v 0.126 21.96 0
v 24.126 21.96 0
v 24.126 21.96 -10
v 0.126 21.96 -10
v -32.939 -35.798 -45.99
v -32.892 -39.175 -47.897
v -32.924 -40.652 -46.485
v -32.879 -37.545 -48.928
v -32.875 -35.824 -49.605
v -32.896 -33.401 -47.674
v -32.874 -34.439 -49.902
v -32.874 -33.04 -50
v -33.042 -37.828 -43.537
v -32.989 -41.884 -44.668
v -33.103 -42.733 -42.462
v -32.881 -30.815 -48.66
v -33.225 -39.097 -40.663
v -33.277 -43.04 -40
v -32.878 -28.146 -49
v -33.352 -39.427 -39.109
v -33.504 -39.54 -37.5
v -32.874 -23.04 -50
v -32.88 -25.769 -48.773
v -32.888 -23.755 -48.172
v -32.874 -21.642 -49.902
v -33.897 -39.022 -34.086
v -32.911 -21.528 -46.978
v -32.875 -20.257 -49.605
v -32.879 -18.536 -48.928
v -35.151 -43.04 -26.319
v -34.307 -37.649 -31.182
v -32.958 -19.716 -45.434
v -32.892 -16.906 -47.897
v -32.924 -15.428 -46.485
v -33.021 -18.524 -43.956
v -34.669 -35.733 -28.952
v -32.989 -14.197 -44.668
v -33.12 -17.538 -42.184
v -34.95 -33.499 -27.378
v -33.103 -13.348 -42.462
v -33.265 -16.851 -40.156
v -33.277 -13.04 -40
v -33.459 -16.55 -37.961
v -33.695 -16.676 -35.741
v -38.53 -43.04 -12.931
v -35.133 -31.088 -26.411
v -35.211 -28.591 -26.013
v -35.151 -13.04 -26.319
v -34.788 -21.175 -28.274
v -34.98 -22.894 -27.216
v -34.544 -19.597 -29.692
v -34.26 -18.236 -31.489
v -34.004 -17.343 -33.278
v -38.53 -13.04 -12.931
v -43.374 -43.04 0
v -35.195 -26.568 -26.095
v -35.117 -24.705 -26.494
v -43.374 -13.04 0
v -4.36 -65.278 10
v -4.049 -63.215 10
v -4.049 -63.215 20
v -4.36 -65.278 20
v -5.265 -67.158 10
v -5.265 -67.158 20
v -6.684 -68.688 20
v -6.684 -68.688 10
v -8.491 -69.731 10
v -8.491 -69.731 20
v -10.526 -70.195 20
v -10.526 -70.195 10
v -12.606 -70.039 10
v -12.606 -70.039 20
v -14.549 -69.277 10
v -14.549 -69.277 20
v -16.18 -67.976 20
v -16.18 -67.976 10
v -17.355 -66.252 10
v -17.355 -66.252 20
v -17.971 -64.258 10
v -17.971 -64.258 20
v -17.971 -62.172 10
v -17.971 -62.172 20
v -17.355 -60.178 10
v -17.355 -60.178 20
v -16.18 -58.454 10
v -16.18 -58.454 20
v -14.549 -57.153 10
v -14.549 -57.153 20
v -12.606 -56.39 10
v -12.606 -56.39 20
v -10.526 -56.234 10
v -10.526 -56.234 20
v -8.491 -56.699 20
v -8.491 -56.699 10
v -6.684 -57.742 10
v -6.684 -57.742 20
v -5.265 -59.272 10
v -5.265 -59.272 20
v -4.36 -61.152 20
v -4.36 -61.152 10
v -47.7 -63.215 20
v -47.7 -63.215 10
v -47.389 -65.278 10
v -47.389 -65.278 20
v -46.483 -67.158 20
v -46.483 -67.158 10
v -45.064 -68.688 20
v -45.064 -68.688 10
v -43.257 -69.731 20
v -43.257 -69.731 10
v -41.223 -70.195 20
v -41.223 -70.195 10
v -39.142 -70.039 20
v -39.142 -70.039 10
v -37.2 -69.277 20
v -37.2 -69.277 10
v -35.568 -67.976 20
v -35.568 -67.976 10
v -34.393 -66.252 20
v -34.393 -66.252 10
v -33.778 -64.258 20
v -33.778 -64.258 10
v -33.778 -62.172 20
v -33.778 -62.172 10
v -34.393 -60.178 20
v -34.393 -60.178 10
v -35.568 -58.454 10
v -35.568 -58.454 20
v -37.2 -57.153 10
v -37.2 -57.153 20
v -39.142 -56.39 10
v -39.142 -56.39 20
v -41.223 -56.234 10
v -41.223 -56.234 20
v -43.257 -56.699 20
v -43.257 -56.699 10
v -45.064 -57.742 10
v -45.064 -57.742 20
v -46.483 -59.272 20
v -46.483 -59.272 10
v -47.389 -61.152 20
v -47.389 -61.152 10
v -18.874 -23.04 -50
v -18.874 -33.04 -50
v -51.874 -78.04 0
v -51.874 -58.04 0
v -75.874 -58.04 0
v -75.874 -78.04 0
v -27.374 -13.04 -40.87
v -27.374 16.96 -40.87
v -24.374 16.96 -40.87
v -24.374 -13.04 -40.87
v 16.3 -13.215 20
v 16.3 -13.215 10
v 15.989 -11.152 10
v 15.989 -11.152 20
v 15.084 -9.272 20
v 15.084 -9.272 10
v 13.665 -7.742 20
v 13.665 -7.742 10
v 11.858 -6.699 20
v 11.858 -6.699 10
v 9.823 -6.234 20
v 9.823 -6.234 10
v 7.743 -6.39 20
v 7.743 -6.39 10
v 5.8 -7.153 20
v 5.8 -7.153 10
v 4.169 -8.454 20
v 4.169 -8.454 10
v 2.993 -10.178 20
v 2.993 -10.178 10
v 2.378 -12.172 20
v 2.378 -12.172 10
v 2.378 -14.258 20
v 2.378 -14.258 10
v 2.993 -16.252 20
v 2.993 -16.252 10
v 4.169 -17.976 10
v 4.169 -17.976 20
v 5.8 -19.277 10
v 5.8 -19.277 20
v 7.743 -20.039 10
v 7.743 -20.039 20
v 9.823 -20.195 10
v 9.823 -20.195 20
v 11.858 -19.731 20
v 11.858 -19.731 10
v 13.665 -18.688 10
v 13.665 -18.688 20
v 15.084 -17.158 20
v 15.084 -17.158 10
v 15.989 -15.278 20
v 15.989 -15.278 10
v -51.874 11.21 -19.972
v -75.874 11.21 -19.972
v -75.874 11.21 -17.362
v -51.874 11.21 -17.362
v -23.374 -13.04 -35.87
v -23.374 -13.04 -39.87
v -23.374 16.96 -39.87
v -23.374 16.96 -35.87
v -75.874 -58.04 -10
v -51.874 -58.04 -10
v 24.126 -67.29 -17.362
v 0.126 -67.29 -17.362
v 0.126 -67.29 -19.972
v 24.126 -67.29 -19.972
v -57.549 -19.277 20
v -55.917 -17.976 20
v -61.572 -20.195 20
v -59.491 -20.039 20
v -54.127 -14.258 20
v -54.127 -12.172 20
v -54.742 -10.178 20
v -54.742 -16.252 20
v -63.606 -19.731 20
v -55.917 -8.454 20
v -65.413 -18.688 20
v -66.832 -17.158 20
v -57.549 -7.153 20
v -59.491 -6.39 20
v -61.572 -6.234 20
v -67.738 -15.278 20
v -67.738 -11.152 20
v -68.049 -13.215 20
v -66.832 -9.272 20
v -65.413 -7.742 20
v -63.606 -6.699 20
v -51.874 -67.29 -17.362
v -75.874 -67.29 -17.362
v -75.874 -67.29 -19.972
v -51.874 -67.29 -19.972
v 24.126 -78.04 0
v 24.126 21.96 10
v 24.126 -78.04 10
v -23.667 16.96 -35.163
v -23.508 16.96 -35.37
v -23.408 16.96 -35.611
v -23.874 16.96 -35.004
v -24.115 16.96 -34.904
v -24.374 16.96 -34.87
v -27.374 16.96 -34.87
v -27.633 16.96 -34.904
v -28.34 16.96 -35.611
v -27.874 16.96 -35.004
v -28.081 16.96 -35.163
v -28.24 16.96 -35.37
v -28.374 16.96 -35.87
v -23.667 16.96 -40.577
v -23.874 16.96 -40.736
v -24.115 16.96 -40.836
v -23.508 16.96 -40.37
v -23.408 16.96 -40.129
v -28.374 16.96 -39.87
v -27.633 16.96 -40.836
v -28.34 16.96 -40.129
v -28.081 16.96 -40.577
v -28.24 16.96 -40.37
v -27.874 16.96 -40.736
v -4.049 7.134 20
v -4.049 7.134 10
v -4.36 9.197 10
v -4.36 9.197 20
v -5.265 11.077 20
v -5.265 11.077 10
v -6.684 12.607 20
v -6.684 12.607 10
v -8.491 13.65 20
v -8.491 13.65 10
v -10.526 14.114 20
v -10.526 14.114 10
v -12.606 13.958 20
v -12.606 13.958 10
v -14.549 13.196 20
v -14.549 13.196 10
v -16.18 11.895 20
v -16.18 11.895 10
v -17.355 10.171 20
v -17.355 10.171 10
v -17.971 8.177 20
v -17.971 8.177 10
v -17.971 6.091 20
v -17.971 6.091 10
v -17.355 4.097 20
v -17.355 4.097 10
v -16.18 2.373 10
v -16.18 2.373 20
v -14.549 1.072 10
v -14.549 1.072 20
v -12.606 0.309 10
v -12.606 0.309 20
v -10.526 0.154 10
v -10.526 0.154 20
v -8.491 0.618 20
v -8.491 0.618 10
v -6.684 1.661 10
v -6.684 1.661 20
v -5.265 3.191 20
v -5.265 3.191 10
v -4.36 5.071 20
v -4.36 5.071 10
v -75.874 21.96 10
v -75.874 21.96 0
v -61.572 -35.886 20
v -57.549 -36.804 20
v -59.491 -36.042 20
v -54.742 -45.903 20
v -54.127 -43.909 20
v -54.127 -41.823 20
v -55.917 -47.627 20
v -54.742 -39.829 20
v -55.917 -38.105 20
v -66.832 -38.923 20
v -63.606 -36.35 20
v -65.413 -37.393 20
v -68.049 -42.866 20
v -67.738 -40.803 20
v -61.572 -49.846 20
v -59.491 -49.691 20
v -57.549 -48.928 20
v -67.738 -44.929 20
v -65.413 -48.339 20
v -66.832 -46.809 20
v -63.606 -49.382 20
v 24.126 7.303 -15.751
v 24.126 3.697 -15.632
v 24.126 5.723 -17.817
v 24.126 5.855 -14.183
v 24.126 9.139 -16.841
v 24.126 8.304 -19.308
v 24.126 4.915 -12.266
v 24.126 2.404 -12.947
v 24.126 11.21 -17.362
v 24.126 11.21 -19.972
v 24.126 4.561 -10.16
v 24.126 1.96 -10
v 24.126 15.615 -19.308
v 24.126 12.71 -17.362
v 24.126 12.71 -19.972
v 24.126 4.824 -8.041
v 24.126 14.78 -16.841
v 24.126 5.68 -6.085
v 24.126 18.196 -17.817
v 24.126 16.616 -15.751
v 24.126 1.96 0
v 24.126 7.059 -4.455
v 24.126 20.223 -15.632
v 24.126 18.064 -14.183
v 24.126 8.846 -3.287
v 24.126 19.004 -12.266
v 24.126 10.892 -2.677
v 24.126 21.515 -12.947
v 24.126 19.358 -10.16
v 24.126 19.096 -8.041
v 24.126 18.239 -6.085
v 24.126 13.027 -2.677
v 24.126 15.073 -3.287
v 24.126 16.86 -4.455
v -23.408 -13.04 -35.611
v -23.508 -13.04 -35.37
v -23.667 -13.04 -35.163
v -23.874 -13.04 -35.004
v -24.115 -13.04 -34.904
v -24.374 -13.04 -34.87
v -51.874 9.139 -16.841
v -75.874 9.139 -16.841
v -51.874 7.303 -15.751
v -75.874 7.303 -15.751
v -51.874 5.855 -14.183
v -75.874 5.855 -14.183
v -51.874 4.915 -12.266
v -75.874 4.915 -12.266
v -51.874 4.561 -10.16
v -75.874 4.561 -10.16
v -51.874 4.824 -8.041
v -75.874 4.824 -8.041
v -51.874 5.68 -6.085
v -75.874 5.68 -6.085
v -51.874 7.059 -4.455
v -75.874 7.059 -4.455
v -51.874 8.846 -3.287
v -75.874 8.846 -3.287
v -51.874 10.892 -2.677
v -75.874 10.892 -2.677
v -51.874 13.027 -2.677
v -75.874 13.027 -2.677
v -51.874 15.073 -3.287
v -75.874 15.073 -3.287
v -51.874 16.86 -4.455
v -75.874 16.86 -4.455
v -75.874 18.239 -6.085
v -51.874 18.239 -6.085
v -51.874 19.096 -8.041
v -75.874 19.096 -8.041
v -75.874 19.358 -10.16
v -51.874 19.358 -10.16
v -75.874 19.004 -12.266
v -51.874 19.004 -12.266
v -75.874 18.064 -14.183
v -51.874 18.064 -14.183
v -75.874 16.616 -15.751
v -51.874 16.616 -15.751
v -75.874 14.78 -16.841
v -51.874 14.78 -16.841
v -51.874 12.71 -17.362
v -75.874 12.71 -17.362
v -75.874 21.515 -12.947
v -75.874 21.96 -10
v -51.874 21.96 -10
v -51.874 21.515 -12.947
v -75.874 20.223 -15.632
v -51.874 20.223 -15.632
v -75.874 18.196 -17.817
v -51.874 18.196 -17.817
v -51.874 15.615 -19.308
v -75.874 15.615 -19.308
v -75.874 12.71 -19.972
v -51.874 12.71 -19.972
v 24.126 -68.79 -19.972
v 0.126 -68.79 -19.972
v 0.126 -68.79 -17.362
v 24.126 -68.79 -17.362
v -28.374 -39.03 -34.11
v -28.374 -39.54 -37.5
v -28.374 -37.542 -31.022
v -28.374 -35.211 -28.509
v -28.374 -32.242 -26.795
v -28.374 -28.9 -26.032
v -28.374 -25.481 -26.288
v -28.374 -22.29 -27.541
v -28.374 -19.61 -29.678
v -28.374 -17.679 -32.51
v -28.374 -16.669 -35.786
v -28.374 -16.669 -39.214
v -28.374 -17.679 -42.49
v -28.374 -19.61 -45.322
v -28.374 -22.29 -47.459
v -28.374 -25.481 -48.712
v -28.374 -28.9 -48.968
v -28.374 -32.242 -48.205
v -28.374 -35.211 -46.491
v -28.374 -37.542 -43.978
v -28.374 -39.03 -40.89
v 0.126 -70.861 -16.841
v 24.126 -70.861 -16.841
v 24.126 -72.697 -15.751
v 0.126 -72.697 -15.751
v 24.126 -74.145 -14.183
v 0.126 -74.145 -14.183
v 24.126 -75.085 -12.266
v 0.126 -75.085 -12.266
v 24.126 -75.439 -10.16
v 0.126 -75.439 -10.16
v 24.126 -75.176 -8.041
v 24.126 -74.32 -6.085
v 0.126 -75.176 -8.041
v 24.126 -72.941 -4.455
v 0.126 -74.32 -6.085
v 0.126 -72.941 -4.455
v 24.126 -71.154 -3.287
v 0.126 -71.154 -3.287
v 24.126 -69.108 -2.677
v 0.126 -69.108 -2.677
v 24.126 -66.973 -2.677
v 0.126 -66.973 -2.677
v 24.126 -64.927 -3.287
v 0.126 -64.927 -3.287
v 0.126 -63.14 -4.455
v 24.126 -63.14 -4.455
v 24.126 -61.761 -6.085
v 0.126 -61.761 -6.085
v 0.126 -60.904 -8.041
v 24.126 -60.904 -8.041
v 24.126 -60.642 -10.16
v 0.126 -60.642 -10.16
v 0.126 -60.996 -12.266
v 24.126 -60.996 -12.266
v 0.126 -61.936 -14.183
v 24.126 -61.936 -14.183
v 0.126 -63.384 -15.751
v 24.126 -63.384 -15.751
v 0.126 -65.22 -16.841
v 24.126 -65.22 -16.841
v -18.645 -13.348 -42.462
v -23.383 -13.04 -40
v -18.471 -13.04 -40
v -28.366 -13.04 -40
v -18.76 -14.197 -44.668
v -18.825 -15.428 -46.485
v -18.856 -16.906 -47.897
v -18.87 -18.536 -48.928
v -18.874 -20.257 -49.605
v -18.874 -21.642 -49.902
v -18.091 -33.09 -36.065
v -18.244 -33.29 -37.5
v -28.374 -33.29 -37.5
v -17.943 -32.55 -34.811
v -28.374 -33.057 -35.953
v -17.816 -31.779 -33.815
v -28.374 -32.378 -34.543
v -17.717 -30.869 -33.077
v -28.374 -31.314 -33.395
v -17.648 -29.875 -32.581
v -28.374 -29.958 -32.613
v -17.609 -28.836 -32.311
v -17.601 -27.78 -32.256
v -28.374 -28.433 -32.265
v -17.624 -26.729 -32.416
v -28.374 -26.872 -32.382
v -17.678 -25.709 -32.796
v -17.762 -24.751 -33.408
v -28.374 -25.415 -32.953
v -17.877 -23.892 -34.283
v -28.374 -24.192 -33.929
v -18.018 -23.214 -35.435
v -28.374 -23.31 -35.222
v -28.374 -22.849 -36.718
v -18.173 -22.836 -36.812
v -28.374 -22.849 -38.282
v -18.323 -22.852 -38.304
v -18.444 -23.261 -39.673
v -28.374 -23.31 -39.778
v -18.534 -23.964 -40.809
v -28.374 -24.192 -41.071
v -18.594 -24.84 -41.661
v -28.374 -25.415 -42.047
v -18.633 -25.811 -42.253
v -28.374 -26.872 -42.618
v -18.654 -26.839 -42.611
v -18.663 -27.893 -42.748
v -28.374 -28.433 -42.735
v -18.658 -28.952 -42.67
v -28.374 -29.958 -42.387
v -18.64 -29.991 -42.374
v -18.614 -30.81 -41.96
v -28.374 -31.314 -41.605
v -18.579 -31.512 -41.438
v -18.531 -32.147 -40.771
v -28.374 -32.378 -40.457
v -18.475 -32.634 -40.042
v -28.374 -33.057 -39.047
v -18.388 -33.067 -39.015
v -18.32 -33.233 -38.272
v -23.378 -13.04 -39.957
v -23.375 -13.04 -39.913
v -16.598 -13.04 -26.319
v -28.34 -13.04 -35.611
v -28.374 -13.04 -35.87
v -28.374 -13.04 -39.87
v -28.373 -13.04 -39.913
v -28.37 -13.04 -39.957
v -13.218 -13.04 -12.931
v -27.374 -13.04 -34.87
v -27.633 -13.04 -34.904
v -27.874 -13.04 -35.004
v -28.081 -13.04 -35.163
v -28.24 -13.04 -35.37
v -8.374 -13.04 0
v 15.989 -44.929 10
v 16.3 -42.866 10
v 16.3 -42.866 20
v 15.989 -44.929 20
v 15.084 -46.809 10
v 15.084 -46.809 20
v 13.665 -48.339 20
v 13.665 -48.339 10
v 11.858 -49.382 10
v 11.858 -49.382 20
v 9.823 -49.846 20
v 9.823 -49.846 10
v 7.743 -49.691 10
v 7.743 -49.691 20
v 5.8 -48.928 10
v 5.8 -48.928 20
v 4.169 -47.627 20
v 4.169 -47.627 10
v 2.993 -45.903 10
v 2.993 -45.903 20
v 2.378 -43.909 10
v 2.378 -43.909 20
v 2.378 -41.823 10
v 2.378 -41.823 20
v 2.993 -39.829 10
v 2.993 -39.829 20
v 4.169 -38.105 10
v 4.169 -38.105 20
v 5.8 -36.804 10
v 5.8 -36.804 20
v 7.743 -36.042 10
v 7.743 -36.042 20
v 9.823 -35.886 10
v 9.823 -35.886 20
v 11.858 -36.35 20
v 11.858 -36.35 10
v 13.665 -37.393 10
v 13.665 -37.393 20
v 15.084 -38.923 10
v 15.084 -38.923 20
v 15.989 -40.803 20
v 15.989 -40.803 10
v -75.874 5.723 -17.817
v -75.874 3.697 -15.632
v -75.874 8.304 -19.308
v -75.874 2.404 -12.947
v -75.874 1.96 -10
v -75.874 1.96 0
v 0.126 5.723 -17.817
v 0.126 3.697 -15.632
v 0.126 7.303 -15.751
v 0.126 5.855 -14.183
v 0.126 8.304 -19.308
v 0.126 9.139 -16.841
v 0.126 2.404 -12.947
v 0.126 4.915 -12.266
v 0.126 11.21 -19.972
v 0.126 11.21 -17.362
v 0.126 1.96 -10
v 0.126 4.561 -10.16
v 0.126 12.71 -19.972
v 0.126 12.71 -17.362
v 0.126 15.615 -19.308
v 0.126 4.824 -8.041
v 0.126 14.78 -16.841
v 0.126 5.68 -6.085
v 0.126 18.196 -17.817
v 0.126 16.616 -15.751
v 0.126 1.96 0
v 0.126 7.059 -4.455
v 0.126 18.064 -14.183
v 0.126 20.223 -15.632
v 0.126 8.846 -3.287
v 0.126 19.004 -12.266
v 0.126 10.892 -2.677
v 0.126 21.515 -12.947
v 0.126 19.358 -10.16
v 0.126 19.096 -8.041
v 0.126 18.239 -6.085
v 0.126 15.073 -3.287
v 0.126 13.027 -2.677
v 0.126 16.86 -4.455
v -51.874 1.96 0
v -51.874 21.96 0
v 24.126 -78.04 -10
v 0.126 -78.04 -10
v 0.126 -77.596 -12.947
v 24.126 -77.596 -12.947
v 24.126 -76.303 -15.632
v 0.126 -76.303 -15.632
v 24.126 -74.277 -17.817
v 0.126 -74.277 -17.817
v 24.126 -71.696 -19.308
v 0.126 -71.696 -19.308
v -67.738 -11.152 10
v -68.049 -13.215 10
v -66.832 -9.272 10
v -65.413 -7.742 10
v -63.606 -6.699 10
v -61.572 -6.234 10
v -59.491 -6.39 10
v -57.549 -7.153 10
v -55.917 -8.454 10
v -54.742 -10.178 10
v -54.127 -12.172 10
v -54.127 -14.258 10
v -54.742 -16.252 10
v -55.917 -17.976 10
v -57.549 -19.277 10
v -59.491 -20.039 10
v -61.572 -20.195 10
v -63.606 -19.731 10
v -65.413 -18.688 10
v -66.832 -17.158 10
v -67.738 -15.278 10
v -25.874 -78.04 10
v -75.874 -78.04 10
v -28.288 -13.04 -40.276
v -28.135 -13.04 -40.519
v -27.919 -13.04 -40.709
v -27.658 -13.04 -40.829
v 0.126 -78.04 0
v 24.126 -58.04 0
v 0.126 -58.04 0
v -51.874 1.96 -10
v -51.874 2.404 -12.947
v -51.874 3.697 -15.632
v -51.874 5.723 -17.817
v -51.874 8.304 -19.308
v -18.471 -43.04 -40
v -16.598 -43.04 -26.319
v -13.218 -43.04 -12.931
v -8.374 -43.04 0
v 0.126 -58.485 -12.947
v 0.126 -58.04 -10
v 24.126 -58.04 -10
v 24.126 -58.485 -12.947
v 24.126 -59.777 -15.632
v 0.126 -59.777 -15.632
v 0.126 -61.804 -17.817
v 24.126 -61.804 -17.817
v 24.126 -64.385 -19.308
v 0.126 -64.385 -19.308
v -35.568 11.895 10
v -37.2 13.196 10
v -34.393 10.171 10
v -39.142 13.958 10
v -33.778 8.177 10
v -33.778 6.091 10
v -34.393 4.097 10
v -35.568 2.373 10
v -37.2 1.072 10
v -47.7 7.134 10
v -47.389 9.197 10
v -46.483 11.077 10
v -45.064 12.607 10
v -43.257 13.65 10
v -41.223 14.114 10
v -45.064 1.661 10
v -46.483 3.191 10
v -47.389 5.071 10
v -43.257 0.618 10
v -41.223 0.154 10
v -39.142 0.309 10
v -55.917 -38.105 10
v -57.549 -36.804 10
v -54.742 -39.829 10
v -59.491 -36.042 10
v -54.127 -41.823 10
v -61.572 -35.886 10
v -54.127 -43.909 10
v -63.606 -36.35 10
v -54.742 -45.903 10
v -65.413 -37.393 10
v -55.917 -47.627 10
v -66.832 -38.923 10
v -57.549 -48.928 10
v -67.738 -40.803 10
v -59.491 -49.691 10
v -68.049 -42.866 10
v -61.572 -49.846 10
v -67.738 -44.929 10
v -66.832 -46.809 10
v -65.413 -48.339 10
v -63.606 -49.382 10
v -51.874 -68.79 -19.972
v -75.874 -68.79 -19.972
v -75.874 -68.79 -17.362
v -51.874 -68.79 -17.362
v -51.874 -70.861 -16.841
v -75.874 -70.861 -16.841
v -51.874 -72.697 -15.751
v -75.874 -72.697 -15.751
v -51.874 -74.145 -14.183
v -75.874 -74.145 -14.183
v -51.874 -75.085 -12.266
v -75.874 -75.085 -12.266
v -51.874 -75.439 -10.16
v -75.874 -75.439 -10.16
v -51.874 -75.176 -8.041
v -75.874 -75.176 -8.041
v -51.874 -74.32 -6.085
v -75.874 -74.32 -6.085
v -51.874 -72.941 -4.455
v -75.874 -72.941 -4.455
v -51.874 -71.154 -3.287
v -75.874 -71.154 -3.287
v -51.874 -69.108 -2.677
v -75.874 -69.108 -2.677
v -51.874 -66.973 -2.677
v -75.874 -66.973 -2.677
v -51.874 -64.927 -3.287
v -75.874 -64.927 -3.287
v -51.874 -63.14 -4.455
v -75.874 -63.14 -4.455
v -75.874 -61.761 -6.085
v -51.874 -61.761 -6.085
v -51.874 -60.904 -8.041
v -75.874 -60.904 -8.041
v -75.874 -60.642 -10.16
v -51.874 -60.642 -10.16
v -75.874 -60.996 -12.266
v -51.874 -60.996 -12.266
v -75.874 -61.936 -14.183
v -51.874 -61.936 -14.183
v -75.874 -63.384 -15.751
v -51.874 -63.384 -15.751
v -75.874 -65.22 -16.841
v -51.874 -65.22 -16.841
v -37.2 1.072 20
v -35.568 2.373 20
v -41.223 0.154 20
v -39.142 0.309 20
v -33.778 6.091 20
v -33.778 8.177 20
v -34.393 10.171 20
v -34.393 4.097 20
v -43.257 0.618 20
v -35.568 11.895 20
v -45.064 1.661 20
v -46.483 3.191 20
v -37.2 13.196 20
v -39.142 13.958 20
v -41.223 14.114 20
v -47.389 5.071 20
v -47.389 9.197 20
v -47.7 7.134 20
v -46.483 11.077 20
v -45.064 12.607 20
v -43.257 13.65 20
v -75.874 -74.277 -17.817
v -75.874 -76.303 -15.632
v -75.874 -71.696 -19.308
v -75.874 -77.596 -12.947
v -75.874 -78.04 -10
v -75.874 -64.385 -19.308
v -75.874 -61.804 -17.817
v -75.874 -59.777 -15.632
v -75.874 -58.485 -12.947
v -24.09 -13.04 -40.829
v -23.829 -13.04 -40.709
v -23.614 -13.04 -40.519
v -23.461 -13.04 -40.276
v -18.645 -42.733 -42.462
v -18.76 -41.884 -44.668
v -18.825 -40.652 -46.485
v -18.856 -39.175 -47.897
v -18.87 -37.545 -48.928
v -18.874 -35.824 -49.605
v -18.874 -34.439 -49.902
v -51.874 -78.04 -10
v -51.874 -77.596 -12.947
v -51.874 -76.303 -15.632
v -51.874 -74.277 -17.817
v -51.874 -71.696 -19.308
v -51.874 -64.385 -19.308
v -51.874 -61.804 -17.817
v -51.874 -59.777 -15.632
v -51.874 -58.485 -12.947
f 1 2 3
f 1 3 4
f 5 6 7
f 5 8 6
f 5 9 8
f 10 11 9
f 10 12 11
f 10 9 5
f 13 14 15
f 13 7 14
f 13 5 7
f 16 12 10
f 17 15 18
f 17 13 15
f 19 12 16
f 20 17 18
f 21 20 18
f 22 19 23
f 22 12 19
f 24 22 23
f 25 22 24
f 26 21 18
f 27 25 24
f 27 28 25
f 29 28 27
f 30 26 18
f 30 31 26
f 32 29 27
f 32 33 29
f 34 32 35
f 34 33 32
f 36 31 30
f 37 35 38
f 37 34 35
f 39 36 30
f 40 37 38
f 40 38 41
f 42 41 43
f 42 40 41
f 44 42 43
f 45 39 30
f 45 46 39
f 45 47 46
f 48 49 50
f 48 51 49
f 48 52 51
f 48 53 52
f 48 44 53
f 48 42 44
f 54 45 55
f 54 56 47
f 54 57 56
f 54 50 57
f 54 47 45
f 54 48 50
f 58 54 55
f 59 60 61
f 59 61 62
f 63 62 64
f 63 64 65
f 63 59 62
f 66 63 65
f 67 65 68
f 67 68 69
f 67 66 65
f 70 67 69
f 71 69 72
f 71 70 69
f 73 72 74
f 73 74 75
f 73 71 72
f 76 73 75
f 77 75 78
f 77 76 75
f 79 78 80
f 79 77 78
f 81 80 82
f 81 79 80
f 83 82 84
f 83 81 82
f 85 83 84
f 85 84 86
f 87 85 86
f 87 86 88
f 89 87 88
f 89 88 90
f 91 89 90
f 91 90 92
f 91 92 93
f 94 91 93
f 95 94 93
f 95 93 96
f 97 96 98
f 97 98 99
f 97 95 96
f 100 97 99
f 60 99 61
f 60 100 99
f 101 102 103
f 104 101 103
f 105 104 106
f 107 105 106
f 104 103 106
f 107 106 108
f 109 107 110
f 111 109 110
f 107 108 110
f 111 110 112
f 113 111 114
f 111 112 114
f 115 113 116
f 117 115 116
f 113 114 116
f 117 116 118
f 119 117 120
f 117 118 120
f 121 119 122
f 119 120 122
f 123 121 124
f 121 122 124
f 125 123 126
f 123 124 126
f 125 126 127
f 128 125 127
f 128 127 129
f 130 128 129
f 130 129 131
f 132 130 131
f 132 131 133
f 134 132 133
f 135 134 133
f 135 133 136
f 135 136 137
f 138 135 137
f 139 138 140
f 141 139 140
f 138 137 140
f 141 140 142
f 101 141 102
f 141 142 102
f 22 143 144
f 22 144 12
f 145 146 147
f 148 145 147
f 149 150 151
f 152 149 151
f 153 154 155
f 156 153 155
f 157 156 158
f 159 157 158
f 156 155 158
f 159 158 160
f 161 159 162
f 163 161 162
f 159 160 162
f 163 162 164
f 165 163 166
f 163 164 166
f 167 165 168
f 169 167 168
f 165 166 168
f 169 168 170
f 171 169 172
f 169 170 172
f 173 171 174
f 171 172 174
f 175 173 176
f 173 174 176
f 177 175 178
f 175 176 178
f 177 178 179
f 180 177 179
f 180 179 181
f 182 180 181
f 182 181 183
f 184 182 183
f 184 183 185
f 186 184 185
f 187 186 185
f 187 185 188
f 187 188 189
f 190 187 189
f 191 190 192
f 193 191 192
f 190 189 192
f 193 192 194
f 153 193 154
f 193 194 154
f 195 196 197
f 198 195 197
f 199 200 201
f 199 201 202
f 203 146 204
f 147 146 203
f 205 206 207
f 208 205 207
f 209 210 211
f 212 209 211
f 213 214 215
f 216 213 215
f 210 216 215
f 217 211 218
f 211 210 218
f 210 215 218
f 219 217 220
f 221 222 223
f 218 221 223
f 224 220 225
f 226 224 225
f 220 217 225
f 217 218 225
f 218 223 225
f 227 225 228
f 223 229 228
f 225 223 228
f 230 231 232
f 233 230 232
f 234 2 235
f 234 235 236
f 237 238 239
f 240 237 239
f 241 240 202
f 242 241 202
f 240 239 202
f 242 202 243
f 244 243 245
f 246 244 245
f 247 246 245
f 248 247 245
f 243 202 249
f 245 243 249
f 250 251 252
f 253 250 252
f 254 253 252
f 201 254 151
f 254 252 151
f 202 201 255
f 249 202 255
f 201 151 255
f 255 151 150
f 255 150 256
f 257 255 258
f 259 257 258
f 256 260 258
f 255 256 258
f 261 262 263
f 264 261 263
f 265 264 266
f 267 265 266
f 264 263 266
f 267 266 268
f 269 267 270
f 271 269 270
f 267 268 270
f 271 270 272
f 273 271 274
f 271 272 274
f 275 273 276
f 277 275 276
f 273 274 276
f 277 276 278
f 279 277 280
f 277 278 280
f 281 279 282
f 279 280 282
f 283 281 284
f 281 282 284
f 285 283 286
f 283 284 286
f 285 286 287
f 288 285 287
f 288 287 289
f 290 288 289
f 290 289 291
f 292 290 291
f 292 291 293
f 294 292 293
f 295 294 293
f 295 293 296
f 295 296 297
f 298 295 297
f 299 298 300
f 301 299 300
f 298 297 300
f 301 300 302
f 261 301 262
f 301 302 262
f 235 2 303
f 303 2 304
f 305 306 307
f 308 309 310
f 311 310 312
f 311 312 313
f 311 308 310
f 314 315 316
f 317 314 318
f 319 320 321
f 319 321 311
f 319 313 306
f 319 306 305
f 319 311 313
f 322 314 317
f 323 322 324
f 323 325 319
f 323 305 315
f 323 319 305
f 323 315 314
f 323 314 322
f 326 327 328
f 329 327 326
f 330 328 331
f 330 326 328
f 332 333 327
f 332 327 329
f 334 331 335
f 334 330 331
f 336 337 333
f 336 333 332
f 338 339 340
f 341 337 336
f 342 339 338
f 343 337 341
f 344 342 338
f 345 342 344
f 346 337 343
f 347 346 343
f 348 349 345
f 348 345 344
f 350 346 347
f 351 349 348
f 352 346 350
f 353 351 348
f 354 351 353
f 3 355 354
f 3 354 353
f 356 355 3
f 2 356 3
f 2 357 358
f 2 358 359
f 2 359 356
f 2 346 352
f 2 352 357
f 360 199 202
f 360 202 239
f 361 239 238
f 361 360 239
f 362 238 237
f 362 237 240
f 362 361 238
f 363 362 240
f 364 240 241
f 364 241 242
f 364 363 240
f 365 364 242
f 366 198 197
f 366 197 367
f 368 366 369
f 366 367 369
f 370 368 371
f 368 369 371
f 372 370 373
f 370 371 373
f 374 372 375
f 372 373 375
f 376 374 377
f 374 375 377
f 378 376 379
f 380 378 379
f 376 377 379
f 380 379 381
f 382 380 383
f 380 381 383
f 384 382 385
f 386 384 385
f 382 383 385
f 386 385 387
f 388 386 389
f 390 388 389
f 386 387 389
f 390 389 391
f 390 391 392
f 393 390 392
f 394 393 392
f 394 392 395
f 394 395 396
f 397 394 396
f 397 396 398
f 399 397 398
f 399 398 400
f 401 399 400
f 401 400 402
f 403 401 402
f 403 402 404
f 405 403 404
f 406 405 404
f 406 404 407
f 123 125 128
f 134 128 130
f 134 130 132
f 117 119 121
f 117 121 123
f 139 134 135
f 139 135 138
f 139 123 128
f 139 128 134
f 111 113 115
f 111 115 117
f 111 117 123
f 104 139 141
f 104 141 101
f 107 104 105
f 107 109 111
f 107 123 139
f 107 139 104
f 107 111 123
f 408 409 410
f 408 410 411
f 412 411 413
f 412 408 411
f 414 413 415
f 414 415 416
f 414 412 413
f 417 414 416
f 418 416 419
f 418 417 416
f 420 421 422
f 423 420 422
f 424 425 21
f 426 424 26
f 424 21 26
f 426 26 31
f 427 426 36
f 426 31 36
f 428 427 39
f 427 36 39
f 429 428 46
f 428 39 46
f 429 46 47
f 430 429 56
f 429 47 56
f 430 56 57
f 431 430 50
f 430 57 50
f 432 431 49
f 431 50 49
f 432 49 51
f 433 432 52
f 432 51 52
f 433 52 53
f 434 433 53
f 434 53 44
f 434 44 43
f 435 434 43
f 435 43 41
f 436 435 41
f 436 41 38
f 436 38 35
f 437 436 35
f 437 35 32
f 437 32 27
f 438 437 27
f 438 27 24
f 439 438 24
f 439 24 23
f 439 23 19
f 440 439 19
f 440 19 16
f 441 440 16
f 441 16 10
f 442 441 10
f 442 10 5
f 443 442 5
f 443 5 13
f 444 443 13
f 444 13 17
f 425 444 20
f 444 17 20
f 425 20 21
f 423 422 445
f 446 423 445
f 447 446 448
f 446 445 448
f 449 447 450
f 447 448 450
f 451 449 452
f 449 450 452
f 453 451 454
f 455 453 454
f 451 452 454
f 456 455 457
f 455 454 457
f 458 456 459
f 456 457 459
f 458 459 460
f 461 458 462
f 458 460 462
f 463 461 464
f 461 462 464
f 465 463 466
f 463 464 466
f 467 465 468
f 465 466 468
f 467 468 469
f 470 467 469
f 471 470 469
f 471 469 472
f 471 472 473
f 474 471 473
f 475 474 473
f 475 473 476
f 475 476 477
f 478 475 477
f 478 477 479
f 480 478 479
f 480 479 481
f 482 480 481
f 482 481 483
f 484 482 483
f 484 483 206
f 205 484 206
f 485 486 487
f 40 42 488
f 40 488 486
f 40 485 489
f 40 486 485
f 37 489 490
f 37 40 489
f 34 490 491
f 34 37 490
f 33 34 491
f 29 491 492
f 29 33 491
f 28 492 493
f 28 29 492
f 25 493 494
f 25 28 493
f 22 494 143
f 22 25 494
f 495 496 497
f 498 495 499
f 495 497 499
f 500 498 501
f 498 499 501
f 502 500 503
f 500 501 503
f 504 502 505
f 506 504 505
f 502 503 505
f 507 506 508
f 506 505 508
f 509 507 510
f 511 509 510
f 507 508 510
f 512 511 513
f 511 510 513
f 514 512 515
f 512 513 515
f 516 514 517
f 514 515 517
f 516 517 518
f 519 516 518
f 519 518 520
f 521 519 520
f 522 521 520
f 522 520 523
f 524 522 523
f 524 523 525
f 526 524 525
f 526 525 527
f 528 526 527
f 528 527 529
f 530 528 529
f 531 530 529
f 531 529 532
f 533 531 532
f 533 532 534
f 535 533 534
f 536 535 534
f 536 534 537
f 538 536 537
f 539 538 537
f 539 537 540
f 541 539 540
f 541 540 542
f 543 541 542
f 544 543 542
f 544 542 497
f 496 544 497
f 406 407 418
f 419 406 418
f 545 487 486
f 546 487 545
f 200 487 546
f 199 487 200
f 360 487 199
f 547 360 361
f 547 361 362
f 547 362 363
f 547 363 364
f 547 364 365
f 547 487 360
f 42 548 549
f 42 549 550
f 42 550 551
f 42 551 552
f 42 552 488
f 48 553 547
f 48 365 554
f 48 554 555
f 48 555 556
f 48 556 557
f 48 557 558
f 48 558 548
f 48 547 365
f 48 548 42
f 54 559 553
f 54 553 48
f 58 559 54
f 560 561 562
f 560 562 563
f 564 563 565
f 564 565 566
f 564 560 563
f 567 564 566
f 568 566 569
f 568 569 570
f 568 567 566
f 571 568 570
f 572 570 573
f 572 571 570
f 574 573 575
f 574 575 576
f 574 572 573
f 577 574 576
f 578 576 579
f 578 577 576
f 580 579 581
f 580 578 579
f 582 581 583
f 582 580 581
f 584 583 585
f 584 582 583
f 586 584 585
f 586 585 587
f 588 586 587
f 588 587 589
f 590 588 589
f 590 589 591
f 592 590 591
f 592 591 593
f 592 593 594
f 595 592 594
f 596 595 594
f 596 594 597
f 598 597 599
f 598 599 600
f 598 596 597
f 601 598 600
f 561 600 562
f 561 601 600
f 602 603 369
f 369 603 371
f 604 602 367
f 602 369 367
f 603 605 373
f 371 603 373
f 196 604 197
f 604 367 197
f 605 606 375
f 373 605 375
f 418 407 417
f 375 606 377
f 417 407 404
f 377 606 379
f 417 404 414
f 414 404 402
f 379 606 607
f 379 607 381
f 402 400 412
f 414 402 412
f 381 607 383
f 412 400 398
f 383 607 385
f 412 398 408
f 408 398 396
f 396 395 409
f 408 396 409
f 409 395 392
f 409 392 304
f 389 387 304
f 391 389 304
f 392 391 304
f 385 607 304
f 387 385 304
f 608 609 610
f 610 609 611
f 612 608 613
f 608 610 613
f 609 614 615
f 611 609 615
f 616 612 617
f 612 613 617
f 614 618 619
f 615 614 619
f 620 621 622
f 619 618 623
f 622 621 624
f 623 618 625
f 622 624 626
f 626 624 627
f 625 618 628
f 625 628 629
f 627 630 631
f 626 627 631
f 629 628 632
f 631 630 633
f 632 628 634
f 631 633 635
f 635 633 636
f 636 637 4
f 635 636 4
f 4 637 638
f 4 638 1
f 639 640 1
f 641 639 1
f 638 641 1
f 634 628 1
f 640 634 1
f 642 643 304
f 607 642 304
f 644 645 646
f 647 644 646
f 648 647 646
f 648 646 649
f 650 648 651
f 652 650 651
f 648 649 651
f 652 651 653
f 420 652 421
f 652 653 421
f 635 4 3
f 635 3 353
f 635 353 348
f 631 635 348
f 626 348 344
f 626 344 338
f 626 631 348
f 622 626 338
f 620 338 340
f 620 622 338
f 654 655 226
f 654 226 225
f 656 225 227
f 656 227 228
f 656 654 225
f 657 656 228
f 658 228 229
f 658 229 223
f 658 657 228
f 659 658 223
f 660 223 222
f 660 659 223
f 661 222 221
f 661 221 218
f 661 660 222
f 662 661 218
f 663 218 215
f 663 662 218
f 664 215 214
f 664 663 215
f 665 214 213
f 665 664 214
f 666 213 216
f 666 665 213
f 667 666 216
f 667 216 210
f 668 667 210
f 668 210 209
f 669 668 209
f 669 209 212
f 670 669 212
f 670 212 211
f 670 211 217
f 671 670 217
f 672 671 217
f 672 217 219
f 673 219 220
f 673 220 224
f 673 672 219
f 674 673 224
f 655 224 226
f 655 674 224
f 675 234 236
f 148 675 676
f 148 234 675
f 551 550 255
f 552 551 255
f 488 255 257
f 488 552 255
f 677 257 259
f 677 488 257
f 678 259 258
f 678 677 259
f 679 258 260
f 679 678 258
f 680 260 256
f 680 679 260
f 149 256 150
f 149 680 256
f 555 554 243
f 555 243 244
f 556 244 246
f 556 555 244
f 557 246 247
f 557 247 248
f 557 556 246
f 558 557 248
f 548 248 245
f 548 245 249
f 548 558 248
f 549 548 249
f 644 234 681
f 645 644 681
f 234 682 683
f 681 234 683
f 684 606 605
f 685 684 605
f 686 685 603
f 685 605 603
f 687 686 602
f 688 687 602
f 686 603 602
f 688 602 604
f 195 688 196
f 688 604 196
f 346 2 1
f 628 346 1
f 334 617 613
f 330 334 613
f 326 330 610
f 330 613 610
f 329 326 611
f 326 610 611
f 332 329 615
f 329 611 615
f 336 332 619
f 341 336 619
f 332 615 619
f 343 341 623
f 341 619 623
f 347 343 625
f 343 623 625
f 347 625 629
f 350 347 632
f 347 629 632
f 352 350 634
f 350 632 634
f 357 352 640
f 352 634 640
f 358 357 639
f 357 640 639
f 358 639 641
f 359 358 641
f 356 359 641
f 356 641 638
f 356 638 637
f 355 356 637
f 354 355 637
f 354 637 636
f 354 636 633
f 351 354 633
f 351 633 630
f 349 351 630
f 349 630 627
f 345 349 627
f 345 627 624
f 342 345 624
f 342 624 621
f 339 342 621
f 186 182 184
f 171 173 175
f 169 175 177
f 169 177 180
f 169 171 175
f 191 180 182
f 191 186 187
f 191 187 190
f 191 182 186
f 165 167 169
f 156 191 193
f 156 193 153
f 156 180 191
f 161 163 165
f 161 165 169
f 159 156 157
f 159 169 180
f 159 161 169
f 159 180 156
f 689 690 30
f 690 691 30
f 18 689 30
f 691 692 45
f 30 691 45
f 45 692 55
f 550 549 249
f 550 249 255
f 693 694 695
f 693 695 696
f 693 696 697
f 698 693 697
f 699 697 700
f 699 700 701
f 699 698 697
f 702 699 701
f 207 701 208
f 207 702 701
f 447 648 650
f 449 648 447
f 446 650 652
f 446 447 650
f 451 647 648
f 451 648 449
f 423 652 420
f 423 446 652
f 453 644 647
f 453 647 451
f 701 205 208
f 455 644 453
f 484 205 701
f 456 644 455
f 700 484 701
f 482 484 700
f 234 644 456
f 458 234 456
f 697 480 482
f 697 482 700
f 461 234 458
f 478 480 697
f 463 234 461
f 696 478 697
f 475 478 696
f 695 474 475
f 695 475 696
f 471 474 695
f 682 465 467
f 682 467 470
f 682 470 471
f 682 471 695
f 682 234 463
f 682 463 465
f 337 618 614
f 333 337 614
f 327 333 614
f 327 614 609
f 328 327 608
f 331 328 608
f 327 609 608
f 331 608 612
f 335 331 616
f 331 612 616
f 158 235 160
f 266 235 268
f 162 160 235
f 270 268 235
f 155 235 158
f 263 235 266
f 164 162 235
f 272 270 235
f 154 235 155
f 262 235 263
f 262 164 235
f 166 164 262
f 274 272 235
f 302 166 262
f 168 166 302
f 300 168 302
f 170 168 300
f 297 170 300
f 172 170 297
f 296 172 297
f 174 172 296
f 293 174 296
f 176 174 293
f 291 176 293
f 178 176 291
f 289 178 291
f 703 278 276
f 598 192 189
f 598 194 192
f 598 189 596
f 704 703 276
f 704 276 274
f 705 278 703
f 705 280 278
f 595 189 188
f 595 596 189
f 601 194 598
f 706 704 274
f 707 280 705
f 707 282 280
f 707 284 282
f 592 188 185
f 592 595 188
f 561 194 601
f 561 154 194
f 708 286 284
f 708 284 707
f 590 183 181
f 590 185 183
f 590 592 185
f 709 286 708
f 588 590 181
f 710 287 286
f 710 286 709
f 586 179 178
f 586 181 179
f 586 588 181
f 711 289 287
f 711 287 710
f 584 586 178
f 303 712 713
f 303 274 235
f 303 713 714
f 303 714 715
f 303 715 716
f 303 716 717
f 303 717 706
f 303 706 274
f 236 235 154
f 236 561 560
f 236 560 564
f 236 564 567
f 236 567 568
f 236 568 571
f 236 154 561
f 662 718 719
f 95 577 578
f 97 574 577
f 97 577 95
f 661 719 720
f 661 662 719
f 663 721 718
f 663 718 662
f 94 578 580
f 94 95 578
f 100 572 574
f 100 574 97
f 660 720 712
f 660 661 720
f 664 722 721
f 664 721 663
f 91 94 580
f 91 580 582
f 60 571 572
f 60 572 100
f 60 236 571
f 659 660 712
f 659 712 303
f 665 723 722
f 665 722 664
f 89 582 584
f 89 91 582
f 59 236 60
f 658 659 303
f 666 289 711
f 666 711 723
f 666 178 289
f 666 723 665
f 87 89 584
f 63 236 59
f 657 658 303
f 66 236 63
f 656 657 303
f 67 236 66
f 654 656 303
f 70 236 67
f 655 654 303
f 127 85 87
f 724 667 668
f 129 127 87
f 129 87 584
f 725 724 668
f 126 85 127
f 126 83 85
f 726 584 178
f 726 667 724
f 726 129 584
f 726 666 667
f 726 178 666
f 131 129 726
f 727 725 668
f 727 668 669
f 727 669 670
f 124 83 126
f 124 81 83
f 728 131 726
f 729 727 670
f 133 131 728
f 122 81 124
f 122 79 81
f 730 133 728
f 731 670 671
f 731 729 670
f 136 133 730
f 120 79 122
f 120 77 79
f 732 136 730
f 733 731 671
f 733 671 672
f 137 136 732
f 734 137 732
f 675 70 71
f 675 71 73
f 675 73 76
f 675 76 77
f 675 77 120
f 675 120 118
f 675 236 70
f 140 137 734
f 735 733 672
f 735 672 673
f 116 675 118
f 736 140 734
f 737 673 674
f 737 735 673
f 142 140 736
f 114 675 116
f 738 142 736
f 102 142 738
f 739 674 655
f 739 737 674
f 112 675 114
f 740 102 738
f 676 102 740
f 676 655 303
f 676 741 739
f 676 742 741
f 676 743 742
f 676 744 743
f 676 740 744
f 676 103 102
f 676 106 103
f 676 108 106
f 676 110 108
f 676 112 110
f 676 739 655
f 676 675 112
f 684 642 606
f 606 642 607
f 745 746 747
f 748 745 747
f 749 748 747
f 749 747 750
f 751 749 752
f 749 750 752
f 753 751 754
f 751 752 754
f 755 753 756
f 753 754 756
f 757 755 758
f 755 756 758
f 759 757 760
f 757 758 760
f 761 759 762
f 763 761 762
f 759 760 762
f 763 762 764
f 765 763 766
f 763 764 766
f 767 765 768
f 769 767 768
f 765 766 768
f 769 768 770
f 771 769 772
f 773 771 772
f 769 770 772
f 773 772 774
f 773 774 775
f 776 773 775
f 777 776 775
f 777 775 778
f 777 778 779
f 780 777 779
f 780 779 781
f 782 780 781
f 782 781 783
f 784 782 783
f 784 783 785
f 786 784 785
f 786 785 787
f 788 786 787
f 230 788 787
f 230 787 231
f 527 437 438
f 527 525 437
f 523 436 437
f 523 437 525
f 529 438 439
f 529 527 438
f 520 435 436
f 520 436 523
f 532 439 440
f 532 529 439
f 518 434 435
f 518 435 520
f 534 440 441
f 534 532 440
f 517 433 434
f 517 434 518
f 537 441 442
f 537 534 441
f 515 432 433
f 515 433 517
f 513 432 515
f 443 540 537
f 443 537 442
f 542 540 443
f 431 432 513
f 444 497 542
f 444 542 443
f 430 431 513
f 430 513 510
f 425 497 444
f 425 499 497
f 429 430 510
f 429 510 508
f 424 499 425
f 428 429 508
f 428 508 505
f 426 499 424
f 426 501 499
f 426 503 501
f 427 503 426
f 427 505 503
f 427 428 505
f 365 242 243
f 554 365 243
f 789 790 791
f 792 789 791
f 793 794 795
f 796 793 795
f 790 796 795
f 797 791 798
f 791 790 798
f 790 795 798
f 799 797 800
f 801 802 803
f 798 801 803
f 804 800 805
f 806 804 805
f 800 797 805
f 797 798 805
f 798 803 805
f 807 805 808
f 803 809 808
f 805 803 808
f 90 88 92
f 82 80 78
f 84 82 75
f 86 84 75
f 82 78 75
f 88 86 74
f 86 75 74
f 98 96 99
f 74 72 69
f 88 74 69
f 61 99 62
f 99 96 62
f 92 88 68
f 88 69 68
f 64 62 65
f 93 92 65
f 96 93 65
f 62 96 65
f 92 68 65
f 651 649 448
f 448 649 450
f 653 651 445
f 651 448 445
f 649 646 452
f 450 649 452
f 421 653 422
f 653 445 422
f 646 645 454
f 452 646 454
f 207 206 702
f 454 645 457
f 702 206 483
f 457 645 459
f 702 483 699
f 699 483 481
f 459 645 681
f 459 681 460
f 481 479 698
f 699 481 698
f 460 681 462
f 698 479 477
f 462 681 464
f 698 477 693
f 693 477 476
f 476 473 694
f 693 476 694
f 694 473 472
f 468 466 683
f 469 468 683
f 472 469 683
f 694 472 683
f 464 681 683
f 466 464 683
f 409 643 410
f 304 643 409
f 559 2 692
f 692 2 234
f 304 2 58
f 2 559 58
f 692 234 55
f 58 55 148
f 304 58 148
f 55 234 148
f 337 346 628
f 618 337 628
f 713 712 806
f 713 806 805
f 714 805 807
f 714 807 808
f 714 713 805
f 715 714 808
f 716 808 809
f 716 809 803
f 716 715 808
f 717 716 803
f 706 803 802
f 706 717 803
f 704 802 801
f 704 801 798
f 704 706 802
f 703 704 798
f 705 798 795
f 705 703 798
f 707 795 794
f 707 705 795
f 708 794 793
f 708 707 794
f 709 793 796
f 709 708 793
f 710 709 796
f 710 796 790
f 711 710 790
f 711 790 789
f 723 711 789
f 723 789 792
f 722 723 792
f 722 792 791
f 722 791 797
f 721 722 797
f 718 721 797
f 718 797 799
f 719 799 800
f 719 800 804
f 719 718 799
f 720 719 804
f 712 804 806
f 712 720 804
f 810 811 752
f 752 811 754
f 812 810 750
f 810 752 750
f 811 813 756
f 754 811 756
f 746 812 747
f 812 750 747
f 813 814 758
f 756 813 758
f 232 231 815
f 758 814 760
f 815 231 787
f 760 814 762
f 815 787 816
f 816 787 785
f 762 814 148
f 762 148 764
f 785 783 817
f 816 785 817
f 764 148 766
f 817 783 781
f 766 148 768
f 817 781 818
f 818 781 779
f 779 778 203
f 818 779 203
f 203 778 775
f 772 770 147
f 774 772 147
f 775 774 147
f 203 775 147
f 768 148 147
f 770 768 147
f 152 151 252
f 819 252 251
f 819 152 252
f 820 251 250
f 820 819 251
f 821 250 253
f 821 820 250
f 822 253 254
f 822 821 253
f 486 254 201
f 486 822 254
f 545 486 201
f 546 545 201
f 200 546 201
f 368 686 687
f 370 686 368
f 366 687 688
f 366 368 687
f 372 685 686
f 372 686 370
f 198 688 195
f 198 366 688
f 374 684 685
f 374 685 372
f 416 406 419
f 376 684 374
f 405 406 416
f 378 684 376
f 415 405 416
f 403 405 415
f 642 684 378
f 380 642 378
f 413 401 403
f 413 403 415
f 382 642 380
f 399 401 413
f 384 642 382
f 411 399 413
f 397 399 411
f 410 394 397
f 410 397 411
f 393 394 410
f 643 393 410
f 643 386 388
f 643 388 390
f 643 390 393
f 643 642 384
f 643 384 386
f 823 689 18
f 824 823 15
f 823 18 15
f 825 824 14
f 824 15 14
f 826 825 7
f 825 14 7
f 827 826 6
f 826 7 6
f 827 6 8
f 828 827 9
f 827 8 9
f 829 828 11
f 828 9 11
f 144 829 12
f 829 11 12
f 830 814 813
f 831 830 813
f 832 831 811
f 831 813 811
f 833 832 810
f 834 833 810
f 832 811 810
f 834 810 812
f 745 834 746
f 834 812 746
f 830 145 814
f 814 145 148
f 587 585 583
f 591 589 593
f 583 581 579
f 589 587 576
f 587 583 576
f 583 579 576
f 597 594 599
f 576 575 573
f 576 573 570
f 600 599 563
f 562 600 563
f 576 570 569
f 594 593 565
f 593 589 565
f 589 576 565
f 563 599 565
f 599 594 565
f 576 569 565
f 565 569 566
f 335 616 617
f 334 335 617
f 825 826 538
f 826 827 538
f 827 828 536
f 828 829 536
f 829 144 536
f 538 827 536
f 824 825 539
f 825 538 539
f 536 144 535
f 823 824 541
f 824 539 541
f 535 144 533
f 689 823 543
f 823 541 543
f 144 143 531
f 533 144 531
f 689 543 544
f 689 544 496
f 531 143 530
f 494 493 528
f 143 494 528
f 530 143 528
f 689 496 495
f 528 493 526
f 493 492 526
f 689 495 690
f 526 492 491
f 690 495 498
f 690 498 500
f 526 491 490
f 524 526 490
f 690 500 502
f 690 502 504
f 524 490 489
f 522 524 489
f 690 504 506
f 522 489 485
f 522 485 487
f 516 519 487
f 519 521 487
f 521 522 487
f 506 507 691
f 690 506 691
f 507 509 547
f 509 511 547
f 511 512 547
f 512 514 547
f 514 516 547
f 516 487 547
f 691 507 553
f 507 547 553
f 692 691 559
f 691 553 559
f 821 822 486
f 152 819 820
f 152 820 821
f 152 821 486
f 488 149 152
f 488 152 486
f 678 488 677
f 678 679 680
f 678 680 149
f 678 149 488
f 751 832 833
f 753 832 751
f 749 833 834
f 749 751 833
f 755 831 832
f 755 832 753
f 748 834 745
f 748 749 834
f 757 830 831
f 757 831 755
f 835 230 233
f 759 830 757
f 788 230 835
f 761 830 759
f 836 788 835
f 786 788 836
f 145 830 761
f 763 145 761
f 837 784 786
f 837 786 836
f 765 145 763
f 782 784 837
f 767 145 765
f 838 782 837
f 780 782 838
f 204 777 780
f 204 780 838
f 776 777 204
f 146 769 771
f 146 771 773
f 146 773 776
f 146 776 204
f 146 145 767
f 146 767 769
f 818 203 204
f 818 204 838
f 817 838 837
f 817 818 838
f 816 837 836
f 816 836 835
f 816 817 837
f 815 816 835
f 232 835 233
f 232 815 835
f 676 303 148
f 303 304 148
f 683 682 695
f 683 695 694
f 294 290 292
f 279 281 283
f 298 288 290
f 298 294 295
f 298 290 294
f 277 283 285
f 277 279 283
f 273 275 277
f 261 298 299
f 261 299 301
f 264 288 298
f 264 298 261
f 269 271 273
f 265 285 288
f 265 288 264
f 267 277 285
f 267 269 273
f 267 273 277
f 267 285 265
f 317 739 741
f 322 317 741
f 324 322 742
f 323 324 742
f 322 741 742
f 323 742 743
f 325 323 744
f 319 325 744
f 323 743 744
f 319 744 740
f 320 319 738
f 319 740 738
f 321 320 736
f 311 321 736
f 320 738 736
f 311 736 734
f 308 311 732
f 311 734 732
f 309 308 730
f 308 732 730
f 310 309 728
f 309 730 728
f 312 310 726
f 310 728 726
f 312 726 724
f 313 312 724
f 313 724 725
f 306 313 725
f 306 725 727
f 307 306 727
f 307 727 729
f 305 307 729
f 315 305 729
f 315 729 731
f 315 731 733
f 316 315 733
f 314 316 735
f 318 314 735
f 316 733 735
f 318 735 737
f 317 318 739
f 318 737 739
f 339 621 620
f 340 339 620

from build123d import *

# Parameters (mm, degrees)
ESBO_O1_W                  = 50
ESBO_O1_H                  = 50
RESSALTO_EXTRUS_O1_DEPTH   = 10
ESBO_O2_R                  = 7
RESSALTO_EXTRUS_O2_DEPTH   = 10
ESPELHAR13_COPY_1_SKETCH_W = 50
ESPELHAR13_COPY_1_SKETCH_H = 50
ESPELHAR13_COPY_1_DEPTH    = 10
ESPELHAR13_COPY_2_SKETCH_R = 7
ESPELHAR13_COPY_2_DEPTH    = 10
ESPELHAR13_COPY_3_SKETCH_W = 50
ESPELHAR13_COPY_3_SKETCH_H = 50
ESPELHAR13_COPY_3_DEPTH    = 10
ESPELHAR13_COPY_4_SKETCH_R = 7
ESPELHAR13_COPY_4_DEPTH    = 10
ESBO_O3_W                  = 24
ESBO_O3_H                  = 20
RESSALTO_EXTRUS_O3_DEPTH   = 20
RESSALTO_EXTRUS_O3_2_DEPTH = 20
RESSALTO_EXTRUS_O3_3_DEPTH = 20
RESSALTO_EXTRUS_O3_4_DEPTH = 20
FILETE3_R                  = 10
FILETE4_R                  = 10
FILETE5_R                  = 10
FILETE6_R                  = 10
CORTE_EXTRUS_O1_DEPTH      = 129.4146105
CORTE_EXTRUS_O1_DEPTH_BACK = 129.4146105
ESBO_O5_W                  = 35
ESBO_O5_H                  = 30
RESSALTO_EXTRUS_O4_DEPTH   = 50
CORTE_EXTRUS_O2_DEPTH      = 112.722433691
CORTE_EXTRUS_O2_DEPTH_BACK = 112.722433691
ESBO_O6_R                  = 11.5
CORTE_EXTRUS_O3_DEPTH      = 15
ESBO_O8_R                  = 5.25
CORTE_EXTRUS_O4_DEPTH      = 107.520243146
FILETE7_R                  = 10
RESSALTO_EXTRUS_O5_DEPTH   = 30


with BuildPart() as part:
    # Esboço1 → Ressalto-extrusão1 (new body)
    with BuildSketch(Plane.XY):
        with Locations((-0.874252483, -3.040452266)):
            Rectangle(ESBO_O1_W, ESBO_O1_H)
    ressalto_extrus_o1 = extrude(amount=RESSALTO_EXTRUS_O1_DEPTH)

    # Esboço2 → Ressalto-extrusão2 (add)
    with BuildSketch(Plane.XY.offset(10)):
        with Locations((-11.048693649, 7.1339889)):
            Circle(ESBO_O2_R)
        with Locations((9.300188683, -13.214893432)):
            Circle(ESBO_O2_R)
    ressalto_extrus_o2 = extrude(amount=RESSALTO_EXTRUS_O2_DEPTH)

    # Espelhar11: Ressalto-extrusão1, Ressalto-extrusão2 across plane
    add(ressalto_extrus_o1.mirror(Plane(origin=(-25.874252483, 21.959547734, 10), x_dir=(0, 0, 1), z_dir=(1, 0, 0))))
    add(ressalto_extrus_o2.mirror(Plane(origin=(-25.874252483, 21.959547734, 10), x_dir=(0, 0, 1), z_dir=(1, 0, 0))))

    # Espelhar12: Ressalto-extrusão1, Ressalto-extrusão2 across plane
    add(ressalto_extrus_o1.mirror(Plane(origin=(-25.874252483, -28.040452266, 10), x_dir=(0, 0, 1), z_dir=(0, 1, 0))))
    add(ressalto_extrus_o2.mirror(Plane(origin=(-25.874252483, -28.040452266, 10), x_dir=(0, 0, 1), z_dir=(0, 1, 0))))

    # Espelhar13 copy 1 sketch → Espelhar13 copy 1 (add)
    with BuildSketch(Plane(origin=(-51.748504966, -56.080904531, 0), x_dir=(-1, 0, 0), z_dir=(0, 0, 1))):
        with Locations((-0.874252483, -3.040452266)):
            Rectangle(ESPELHAR13_COPY_1_SKETCH_W, ESPELHAR13_COPY_1_SKETCH_H)
    extrude(amount=ESPELHAR13_COPY_1_DEPTH)

    # Espelhar13 copy 2 sketch → Espelhar13 copy 2 (add)
    with BuildSketch(Plane(origin=(-51.748504966, -56.080904531, 10), x_dir=(-1, 0, 0), z_dir=(0, 0, 1))):
        with Locations((-11.048693649, 7.1339889)):
            Circle(ESPELHAR13_COPY_2_SKETCH_R)
        with Locations((9.300188683, -13.214893432)):
            Circle(ESPELHAR13_COPY_2_SKETCH_R)
    extrude(amount=ESPELHAR13_COPY_2_DEPTH)

    # Espelhar13 copy 3 sketch → Espelhar13 copy 3 (add)
    with BuildSketch(Plane(origin=(-51.748504966, 0, 0), x_dir=(-1, 0, 0), z_dir=(0, 0, 1))):
        with Locations((-0.874252483, 3.040452266)):
            Rectangle(ESPELHAR13_COPY_3_SKETCH_W, ESPELHAR13_COPY_3_SKETCH_H)
    extrude(amount=ESPELHAR13_COPY_3_DEPTH)

    # Espelhar13 copy 4 sketch → Espelhar13 copy 4 (add)
    with BuildSketch(Plane(origin=(-51.748504966, 0, 10), x_dir=(-1, 0, 0), z_dir=(0, 0, 1))):
        with Locations((-11.048693649, -7.1339889)):
            Circle(ESPELHAR13_COPY_4_SKETCH_R)
        with Locations((9.300188683, 13.214893432)):
            Circle(ESPELHAR13_COPY_4_SKETCH_R)
    extrude(amount=ESPELHAR13_COPY_4_DEPTH)

    # Esboço5 → Ressalto-extrusão4 (add)
    with BuildSketch(Plane(origin=(0, 0, 0), x_dir=(-1, 0, 0), z_dir=(0, 0, -1))):
        with Locations((25.874252483, -28.040452266)):
            Rectangle(ESBO_O5_W, ESBO_O5_H)
    extrude(amount=RESSALTO_EXTRUS_O4_DEPTH)

    # Esboço7 → Corte-extrusão2 (cut, two sides: drawn at the far end of the back side and taken through both)
    with BuildSketch(Plane.XZ.offset(43.040452266).offset(-CORTE_EXTRUS_O2_DEPTH_BACK)):
        with BuildLine():
            Line((-8.374252483, 0), (-8.374252483, -50))
            Line((-8.374252483, -50), (-18.874252483, -50))
            ThreePointArc((-18.874252483, -50), (-16.220932935, -24.454697105), (-8.374252483, 0))
        make_face()
        with BuildLine():
            Line((-43.374252483, 0), (-43.374252483, -50))
            Line((-43.374252483, -50), (-32.874252483, -50))
            ThreePointArc((-32.874252483, -50), (-35.52757203, -24.454697105), (-43.374252483, 0))
        make_face()
    extrude(amount=CORTE_EXTRUS_O2_DEPTH + CORTE_EXTRUS_O2_DEPTH_BACK, mode=Mode.SUBTRACT)

    # Esboço6 → Corte-extrusão3 (cut)
    with BuildSketch(Plane.ZY.offset(43.374252483)):
        with Locations(Location((-37.5, -28.040452266, 0), (0, 0, 270))):
            Circle(ESBO_O6_R)
    extrude(amount=-CORTE_EXTRUS_O3_DEPTH, mode=Mode.SUBTRACT)

    # Esboço8 → Corte-extrusão4 (cut, through all)
    with BuildSketch(Plane.ZY.offset(28.374252483)):
        with Locations(Location((-37.5, -28.040452266, 0), (0, 0, 270))):
            Circle(ESBO_O8_R)
    extrude(amount=-CORTE_EXTRUS_O4_DEPTH, mode=Mode.SUBTRACT)

    # Filete7
    filete7_edges = [part.edges().sort_by_distance(p)[0] for p in [
        (-25.874252483, -13.040452266, -50),
        (-25.874252483, -43.040452266, -50),
    ]]
    fillet(filete7_edges, radius=FILETE7_R)

    # Esboço9 → Ressalto-extrusão5 (add)
    with BuildSketch(Plane(origin=(0, -13.040452266, 0), x_dir=(1, 0, 0), z_dir=(0, 1, 0))):
        with BuildLine():
            Line((-27.374252483, 40.870080229), (-24.374252483, 40.870080229))
            ThreePointArc((-24.374252483, 40.870080229), (-23.667145702, 40.57718701), (-23.374252483, 39.870080229))
            Line((-23.374252483, 39.870080229), (-23.374252483, 35.870080229))
            ThreePointArc((-23.374252483, 35.870080229), (-23.667145702, 35.162973448), (-24.374252483, 34.870080229))
            Line((-24.374252483, 34.870080229), (-27.374252483, 34.870080229))
            ThreePointArc((-27.374252483, 34.870080229), (-28.081359264, 35.162973448), (-28.374252483, 35.870080229))
            Line((-28.374252483, 35.870080229), (-28.374252483, 39.870080229))
            ThreePointArc((-28.374252483, 39.870080229), (-28.081359264, 40.57718701), (-27.374252483, 40.870080229))
        make_face()
    extrude(amount=RESSALTO_EXTRUS_O5_DEPTH)


with BuildPart() as body_2:
    # Esboço3 → Ressalto-extrusão3 (new body)
    with BuildSketch(Plane(origin=(0, 0, 0), x_dir=(-1, 0, 0), z_dir=(0, 0, -1))):
        with Locations((-12.125747517, -68.040452266)):
            Rectangle(ESBO_O3_W, ESBO_O3_H)
    extrude(amount=RESSALTO_EXTRUS_O3_DEPTH)

    # Filete3
    filete3_edges = [body_2.edges().sort_by_distance(p)[0] for p in [
        (12.125747517, -58.040452266, -20),
        (12.125747517, -78.040452266, -20),
    ]]
    fillet(filete3_edges, radius=FILETE3_R - 0.0001)  # a hair under: the kernel refuses the full size


with BuildPart() as body_3:
    # Esboço3 → Ressalto-extrus_o3 2 (new body)
    with BuildSketch(Plane(origin=(0, 0, 0), x_dir=(-1, 0, 0), z_dir=(0, 0, -1))):
        with Locations((63.874252483, -68.040452266)):
            Rectangle(ESBO_O3_W, ESBO_O3_H)
    extrude(amount=RESSALTO_EXTRUS_O3_2_DEPTH)

    # Filete4
    filete4_edges = [body_3.edges().sort_by_distance(p)[0] for p in [
        (-63.874252483, -58.040452266, -20),
        (-63.874252483, -78.040452266, -20),
    ]]
    fillet(filete4_edges, radius=FILETE4_R - 0.0001)  # a hair under: the kernel refuses the full size


with BuildPart() as body_4:
    # Esboço3 → Ressalto-extrus_o3 3 (new body)
    with BuildSketch(Plane(origin=(0, 0, 0), x_dir=(-1, 0, 0), z_dir=(0, 0, -1))):
        with Locations((63.874252483, 11.959547734)):
            Rectangle(ESBO_O3_W, ESBO_O3_H)
    extrude(amount=RESSALTO_EXTRUS_O3_3_DEPTH)

    # Filete6
    filete6_edges = [body_4.edges().sort_by_distance(p)[0] for p in [
        (-63.874252483, 21.959547734, -20),
        (-63.874252483, 1.959547734, -20),
    ]]
    fillet(filete6_edges, radius=FILETE6_R - 0.0001)  # a hair under: the kernel refuses the full size


with BuildPart() as body_5:
    # Esboço3 → Ressalto-extrus_o3 4 (new body)
    with BuildSketch(Plane(origin=(0, 0, 0), x_dir=(-1, 0, 0), z_dir=(0, 0, -1))):
        with Locations((-12.125747517, 11.959547734)):
            Rectangle(ESBO_O3_W, ESBO_O3_H)
    extrude(amount=RESSALTO_EXTRUS_O3_4_DEPTH)

    # Filete5
    filete5_edges = [body_5.edges().sort_by_distance(p)[0] for p in [
        (12.125747517, 21.959547734, -20),
        (12.125747517, 1.959547734, -20),
    ]]
    fillet(filete5_edges, radius=FILETE5_R - 0.0001)  # a hair under: the kernel refuses the full size


with BuildPart() as corte_extrus_o1_tool:
    # Esboço4 → Corte-extrusão1 (new, two sides: drawn at the far end of the back side and taken through both)
    with BuildSketch(Plane(origin=(24.125747517, 0, 0), x_dir=(0, 0, -1), z_dir=(1, 0, 0)).offset(-CORTE_EXTRUS_O1_DEPTH_BACK)):
        with BuildLine():
            Line((20.351378214, -68.790452266), (17.361895136, -68.790452266))
            ThreePointArc((17.361895136, -68.790452266), (2.6, -68.040452266), (17.361895136, -67.290452266))
            Line((17.361895136, -67.290452266), (20.351378214, -67.290452266))
            Line((20.351378214, -67.290452266), (20.351378214, -68.790452266))
        make_face()
        with BuildLine():
            Line((20.351378214, 11.209547734), (17.361895136, 11.209547734))
            ThreePointArc((17.361895136, 11.209547734), (2.6, 11.959547734), (17.361895136, 12.709547734))
            Line((17.361895136, 12.709547734), (20.351378214, 12.709547734))
            Line((20.351378214, 12.709547734), (20.351378214, 11.209547734))
        make_face()
    extrude(amount=CORTE_EXTRUS_O1_DEPTH + CORTE_EXTRUS_O1_DEPTH_BACK)


with BuildPart() as body_2_1:
    add(body_2.part)

    # Corte-extrusão1: cut by corte_extrus_o1_tool
    add(corte_extrus_o1_tool.part, mode=Mode.SUBTRACT)


with BuildPart() as body_3_1:
    add(body_3.part)

    # Corte-extrusão1: cut by corte_extrus_o1_tool
    add(corte_extrus_o1_tool.part, mode=Mode.SUBTRACT)


with BuildPart() as body_4_1:
    add(body_4.part)

    # Corte-extrusão1: cut by corte_extrus_o1_tool
    add(corte_extrus_o1_tool.part, mode=Mode.SUBTRACT)


with BuildPart() as body_5_1:
    add(body_5.part)

    # Corte-extrusão1: cut by corte_extrus_o1_tool
    add(corte_extrus_o1_tool.part, mode=Mode.SUBTRACT)


solid = Compound([part.part, body_2_1.part, body_3_1.part, body_4_1.part, body_5_1.part])
